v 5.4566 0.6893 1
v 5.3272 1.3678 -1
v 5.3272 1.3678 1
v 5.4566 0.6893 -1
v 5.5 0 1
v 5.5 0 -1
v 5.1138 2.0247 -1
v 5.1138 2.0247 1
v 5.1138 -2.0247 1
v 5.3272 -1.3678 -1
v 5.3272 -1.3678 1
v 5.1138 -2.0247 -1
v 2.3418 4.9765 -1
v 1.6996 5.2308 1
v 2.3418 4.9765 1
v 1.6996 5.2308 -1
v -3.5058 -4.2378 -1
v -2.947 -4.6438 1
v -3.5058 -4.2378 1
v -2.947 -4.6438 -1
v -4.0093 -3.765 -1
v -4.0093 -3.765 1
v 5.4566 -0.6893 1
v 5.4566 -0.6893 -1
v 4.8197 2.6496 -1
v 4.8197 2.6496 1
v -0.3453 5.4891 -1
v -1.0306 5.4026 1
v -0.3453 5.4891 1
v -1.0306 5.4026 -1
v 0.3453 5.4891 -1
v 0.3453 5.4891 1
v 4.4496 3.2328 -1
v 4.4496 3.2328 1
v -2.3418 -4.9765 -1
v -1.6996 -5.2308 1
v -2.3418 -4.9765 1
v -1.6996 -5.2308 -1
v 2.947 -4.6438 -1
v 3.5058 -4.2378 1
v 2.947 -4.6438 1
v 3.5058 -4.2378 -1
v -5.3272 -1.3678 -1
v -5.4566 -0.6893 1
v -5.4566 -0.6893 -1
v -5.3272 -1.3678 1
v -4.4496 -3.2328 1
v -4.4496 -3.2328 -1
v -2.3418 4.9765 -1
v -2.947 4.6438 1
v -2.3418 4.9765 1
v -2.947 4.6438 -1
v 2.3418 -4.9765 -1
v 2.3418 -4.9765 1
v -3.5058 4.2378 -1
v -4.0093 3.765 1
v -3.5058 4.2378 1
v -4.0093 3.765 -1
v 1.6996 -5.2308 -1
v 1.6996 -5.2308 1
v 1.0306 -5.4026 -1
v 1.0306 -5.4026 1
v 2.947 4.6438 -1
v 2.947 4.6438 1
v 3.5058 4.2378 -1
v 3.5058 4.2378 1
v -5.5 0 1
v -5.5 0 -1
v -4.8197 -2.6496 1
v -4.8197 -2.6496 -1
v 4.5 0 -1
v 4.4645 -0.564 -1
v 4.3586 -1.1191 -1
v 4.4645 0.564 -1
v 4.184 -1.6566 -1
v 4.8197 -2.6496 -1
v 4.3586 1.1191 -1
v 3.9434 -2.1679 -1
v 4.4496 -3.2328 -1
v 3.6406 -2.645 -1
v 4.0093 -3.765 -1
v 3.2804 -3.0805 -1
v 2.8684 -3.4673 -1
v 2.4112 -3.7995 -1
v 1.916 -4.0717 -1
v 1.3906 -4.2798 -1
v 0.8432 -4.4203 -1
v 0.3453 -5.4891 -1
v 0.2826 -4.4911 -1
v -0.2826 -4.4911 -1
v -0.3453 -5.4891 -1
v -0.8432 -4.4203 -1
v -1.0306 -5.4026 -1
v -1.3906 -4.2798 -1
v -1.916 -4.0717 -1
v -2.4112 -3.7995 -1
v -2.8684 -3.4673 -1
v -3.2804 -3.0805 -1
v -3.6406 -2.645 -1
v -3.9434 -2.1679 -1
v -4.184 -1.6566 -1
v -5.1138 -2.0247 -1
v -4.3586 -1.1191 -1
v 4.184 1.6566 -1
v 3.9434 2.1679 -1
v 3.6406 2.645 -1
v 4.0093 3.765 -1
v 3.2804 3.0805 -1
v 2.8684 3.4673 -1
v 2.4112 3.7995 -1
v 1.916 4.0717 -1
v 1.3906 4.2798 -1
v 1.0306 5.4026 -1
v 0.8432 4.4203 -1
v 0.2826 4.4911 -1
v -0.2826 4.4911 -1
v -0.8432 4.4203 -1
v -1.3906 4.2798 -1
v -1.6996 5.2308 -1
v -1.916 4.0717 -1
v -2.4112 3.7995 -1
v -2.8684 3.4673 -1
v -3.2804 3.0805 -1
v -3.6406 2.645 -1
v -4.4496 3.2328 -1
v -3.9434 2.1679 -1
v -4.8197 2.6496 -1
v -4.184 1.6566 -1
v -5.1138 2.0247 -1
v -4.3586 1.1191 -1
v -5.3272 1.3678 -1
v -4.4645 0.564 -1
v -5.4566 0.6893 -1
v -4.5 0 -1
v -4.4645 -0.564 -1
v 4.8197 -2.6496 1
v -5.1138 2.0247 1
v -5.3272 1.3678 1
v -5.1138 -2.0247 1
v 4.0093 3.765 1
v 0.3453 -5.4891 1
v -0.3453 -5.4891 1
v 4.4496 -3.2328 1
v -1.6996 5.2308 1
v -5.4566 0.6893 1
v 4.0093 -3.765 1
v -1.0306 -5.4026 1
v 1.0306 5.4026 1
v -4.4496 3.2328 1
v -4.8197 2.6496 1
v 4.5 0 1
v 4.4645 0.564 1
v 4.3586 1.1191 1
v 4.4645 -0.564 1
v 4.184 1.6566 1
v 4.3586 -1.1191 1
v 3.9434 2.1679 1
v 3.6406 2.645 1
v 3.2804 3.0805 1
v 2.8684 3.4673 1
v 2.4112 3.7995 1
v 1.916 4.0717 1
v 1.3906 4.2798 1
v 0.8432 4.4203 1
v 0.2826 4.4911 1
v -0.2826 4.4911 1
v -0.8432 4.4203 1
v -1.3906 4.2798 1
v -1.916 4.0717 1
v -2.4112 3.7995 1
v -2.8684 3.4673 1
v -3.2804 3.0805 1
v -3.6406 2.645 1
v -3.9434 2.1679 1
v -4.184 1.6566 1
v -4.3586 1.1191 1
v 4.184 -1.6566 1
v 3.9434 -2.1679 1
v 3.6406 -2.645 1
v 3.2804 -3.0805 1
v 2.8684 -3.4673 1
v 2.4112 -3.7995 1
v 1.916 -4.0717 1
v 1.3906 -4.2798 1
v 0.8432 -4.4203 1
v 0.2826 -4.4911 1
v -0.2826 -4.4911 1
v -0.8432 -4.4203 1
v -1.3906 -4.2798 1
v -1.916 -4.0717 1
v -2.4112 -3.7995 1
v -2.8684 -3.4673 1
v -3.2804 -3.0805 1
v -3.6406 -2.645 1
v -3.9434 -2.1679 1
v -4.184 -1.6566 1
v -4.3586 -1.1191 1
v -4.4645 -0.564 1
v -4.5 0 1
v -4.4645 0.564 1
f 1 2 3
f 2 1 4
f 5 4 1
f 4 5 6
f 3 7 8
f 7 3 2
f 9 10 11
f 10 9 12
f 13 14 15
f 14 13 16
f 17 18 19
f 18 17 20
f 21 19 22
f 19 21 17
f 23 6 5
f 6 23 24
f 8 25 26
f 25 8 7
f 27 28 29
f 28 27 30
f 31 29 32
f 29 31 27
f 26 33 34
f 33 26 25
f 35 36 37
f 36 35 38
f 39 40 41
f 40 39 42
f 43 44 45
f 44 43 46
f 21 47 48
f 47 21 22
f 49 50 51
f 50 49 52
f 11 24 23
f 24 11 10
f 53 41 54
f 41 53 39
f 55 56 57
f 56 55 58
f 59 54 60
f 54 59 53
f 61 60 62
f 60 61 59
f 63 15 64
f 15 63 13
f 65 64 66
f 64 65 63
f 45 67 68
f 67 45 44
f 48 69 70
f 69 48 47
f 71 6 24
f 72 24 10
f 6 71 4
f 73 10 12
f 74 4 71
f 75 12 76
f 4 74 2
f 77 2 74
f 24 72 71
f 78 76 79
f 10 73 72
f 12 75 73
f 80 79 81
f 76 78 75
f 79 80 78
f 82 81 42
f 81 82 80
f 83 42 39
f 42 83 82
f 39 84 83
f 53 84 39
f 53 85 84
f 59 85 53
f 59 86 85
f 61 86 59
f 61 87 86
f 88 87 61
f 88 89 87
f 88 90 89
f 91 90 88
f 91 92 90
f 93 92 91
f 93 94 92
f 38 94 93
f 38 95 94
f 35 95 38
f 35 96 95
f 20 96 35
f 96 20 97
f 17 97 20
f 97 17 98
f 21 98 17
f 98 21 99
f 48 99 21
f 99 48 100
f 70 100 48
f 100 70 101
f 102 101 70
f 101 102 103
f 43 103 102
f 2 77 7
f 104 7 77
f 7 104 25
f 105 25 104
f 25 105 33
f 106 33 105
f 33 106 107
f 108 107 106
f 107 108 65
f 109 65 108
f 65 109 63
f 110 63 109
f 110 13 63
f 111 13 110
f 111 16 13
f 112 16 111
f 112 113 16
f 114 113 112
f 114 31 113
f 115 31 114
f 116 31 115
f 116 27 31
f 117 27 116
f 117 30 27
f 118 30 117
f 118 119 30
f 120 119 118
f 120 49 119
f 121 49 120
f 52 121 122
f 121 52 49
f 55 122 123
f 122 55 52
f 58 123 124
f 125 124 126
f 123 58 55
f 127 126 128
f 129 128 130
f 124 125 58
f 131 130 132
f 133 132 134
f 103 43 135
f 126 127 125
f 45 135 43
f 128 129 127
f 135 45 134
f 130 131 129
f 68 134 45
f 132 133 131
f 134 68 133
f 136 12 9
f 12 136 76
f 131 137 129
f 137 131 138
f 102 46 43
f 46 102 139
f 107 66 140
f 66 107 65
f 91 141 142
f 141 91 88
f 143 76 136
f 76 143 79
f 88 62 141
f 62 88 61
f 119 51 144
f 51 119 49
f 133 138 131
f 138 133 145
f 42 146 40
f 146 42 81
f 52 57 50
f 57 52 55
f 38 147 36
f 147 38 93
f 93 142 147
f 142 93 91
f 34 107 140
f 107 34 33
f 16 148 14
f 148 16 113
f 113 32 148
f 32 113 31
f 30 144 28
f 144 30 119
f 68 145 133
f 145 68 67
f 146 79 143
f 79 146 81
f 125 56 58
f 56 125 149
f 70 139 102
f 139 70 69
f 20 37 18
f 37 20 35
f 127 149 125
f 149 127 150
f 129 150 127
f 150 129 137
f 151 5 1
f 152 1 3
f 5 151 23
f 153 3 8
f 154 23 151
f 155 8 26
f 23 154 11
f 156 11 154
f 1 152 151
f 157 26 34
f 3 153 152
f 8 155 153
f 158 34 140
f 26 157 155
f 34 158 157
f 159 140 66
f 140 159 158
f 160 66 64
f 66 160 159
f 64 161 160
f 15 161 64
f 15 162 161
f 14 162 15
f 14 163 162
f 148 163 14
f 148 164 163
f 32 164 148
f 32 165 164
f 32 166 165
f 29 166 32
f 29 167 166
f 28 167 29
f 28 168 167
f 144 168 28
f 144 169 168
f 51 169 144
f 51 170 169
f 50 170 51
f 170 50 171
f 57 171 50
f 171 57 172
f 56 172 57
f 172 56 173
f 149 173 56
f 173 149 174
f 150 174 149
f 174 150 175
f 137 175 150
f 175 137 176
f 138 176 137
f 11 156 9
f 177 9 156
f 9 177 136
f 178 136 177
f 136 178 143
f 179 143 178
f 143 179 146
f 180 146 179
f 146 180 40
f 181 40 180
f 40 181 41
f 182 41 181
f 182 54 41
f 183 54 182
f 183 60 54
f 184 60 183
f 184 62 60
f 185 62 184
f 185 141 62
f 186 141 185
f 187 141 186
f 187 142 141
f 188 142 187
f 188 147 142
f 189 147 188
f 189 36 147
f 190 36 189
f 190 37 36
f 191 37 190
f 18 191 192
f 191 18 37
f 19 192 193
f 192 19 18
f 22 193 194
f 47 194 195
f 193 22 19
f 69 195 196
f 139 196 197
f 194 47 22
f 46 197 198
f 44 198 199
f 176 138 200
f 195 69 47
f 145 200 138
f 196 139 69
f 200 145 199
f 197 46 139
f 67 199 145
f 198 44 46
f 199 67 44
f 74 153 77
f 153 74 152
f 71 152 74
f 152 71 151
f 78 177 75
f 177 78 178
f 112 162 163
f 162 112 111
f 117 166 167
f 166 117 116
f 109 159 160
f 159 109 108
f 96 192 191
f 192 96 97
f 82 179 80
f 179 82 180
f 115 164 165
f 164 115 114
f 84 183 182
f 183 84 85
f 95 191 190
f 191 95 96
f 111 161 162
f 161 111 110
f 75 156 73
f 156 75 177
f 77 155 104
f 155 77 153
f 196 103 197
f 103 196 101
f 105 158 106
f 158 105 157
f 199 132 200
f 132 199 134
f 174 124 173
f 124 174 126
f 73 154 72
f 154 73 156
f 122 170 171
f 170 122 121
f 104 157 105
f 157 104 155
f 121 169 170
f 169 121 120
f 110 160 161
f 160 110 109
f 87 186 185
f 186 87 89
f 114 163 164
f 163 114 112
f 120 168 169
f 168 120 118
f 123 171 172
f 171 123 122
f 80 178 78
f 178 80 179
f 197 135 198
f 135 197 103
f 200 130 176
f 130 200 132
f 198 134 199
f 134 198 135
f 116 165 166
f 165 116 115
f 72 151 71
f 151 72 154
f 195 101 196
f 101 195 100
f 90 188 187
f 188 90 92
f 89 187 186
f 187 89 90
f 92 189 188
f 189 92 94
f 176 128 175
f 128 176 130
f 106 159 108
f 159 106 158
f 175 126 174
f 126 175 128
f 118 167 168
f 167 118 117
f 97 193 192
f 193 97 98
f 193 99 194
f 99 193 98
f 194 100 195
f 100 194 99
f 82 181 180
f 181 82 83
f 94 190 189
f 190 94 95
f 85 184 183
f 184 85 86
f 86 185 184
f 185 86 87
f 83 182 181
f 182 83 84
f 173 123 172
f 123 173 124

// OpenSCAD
$fn = 50;


difference() {
	union() {
		translate(v = [0, 0, -1.0000000000]) {
			cylinder(h = 2, r = 5.5000000000);
		}
	}
	union() {
		translate(v = [0, 0, -100.0000000000]) {
			cylinder(h = 200, r = 4.5000000000);
		}
	}
}
